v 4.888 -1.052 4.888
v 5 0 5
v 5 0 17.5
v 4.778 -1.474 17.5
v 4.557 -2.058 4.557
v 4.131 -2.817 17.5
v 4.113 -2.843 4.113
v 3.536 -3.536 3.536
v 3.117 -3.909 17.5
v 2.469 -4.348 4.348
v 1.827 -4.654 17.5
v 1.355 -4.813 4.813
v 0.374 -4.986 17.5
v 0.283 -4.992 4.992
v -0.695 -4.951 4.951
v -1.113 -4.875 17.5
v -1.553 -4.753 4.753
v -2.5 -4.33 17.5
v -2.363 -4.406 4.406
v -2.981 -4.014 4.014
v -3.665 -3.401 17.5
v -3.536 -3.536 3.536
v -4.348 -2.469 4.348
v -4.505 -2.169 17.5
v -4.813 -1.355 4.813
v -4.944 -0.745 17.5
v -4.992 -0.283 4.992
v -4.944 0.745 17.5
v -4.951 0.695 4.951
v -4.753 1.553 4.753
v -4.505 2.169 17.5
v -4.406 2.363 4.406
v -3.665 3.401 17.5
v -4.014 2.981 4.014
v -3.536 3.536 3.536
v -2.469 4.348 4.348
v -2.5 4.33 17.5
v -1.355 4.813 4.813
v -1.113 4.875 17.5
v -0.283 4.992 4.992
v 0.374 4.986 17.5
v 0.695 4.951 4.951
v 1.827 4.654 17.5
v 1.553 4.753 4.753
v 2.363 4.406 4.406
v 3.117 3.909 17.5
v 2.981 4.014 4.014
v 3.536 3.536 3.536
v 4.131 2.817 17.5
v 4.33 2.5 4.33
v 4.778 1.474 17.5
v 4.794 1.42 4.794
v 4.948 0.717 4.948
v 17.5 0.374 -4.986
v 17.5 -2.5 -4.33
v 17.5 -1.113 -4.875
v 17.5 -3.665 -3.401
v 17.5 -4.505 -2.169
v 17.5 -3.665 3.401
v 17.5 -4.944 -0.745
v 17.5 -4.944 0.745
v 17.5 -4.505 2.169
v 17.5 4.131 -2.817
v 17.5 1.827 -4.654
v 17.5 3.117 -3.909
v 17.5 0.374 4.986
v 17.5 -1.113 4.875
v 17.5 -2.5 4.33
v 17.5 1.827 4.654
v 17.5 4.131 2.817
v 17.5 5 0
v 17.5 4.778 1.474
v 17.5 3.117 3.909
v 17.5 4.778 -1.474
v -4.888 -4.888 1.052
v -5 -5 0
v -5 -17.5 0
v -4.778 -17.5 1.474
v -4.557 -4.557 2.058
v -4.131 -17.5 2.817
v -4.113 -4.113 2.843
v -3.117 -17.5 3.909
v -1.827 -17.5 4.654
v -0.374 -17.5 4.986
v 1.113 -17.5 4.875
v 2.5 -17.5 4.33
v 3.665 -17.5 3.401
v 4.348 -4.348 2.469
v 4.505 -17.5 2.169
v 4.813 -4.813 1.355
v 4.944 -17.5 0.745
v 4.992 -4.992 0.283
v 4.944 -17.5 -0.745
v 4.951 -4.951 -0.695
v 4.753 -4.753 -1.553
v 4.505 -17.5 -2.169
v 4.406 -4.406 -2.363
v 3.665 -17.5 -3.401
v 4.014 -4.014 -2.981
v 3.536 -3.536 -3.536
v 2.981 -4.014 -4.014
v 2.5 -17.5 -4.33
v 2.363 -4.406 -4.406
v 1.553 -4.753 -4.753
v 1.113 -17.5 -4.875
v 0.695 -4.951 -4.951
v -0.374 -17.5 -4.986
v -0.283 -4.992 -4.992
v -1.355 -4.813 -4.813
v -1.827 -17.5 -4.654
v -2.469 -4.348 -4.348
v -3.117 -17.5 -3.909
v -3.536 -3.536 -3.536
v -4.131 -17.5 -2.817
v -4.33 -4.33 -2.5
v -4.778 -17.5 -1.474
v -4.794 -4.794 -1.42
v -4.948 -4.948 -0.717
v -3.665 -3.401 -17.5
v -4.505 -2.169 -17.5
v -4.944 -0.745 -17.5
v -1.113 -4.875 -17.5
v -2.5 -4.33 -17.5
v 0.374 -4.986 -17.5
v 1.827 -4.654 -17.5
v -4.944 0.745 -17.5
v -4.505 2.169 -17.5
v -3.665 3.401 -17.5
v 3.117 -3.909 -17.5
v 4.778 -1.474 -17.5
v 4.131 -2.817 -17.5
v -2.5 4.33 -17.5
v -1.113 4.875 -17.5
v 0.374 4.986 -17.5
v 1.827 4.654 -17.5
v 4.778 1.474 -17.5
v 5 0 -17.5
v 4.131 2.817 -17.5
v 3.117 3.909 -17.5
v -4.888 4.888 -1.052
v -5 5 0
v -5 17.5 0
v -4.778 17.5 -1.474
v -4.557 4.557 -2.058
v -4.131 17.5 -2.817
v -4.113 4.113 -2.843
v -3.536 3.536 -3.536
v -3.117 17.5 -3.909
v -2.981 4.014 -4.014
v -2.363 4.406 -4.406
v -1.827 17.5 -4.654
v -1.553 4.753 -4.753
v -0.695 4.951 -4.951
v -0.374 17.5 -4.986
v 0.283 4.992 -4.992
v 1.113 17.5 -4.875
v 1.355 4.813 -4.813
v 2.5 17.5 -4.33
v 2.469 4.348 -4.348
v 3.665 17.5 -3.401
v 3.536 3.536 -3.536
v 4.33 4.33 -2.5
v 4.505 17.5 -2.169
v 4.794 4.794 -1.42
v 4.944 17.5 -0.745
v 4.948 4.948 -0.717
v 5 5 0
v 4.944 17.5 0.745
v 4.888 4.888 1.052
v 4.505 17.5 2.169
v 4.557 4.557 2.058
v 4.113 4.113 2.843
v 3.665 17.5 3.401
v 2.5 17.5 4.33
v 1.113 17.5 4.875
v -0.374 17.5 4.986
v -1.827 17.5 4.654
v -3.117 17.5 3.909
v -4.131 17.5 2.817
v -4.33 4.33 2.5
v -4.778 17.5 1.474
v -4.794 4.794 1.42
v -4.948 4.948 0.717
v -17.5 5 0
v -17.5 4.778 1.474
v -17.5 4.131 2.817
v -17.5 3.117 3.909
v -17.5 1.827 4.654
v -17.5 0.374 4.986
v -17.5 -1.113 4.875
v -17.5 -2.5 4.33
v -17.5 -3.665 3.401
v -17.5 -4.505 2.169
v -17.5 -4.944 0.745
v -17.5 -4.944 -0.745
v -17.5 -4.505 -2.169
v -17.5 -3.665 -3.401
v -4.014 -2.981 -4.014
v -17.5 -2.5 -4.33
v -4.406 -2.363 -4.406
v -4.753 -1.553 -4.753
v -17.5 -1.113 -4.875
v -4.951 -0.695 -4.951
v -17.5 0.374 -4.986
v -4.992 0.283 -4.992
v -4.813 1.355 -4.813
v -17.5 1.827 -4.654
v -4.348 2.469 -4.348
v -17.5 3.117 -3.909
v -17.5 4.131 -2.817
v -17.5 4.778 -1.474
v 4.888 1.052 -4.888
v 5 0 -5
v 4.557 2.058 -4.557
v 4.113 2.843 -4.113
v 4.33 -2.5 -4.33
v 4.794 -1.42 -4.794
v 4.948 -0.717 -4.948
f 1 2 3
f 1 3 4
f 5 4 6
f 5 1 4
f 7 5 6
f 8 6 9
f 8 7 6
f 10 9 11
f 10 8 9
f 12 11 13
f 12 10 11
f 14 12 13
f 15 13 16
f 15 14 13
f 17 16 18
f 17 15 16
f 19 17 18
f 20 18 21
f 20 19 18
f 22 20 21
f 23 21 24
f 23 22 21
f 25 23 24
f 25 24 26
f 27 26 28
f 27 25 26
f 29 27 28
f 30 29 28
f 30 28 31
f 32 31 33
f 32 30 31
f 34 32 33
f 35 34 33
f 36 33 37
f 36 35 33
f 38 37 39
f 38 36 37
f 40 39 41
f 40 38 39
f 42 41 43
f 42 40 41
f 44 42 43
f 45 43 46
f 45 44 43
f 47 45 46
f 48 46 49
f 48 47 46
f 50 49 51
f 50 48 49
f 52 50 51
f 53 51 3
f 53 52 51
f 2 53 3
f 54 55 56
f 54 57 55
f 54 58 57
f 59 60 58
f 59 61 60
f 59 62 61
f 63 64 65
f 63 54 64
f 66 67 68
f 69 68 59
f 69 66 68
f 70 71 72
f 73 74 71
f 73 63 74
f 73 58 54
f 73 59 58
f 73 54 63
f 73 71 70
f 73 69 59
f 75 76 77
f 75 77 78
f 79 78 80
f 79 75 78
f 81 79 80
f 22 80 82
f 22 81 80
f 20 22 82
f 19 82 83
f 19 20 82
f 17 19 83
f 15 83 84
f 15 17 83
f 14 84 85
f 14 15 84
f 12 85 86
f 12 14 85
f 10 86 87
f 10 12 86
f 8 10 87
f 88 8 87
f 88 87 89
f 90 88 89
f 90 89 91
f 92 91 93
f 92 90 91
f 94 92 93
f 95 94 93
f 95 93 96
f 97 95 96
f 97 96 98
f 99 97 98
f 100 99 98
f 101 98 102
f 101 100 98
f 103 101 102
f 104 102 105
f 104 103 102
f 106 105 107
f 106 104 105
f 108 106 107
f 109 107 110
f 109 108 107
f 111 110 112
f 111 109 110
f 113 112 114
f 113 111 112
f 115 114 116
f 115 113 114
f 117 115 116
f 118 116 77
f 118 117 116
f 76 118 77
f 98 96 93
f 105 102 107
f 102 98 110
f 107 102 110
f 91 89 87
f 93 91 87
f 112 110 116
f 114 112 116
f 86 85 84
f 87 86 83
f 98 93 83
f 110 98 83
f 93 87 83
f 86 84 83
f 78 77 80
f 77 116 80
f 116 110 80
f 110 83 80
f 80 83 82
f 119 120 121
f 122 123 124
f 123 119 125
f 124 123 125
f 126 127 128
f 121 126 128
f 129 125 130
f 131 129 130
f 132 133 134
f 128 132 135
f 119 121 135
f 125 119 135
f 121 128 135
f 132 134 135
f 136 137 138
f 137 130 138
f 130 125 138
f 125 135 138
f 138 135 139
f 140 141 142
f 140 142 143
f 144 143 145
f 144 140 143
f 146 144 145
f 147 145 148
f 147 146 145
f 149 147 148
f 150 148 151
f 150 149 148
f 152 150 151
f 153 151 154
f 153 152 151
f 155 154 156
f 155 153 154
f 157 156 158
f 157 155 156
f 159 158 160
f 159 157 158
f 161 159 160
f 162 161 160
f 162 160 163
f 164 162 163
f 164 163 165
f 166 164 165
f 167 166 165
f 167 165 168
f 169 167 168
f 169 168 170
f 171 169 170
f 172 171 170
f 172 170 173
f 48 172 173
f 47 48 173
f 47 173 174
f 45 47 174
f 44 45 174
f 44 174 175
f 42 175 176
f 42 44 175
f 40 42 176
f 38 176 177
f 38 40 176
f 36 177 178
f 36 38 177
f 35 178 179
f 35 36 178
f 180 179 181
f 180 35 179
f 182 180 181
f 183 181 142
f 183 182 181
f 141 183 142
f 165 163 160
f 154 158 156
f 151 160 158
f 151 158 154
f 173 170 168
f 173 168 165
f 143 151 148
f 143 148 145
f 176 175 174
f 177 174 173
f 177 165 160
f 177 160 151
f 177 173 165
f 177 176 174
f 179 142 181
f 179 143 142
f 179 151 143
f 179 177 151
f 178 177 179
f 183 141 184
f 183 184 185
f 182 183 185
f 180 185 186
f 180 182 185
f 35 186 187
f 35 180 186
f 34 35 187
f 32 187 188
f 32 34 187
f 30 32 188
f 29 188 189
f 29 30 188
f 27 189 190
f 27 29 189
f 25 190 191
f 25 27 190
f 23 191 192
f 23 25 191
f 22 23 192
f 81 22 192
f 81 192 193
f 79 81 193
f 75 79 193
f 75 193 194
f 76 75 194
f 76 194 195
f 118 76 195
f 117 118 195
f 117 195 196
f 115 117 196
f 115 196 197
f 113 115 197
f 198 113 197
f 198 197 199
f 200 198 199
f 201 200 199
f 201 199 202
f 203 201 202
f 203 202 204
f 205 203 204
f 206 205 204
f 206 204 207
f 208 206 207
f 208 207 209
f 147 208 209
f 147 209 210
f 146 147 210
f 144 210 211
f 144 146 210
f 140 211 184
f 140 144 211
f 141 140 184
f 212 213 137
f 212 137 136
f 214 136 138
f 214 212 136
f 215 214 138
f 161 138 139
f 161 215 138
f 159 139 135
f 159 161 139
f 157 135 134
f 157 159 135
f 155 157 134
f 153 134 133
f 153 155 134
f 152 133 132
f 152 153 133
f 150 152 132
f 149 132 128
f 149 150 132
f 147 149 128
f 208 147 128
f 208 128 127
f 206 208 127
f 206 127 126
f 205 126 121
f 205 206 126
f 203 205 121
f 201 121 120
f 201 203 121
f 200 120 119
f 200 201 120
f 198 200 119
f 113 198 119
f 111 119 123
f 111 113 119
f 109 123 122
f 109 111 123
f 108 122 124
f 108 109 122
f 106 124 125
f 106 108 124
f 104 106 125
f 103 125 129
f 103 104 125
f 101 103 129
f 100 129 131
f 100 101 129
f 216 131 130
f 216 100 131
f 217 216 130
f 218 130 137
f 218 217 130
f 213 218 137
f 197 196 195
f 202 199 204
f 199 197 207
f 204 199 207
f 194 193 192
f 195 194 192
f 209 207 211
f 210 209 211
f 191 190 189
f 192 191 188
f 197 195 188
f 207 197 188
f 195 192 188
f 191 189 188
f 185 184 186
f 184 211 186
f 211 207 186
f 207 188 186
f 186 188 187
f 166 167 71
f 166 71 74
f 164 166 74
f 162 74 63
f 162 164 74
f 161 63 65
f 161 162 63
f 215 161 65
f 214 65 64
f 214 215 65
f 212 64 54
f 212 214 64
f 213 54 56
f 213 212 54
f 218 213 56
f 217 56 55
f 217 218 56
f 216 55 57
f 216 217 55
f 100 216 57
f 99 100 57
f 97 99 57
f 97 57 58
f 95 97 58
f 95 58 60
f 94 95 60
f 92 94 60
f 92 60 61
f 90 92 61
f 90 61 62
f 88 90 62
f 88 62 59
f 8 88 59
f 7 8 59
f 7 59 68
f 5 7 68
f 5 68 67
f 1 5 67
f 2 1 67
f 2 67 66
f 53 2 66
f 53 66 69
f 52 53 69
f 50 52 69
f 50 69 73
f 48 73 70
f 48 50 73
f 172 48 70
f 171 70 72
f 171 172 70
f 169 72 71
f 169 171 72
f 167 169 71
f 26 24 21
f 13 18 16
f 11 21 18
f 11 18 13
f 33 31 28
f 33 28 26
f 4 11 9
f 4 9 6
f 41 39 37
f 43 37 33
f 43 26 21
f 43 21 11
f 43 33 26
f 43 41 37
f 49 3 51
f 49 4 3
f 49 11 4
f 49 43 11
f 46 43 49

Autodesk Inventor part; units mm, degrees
ref_plane "YZ Plane" through (0, 0, 0) normal (1, 0, 0) x (0, 1, 0)
ref_plane "XZ Plane" through (0, 0, 0) normal (0, 1, 0) x (-1, 0, 0)
ref_plane "XY Plane" through (0, 0, 0) normal (0, 0, 1) x (1, 0, 0)
sketch "Skizze1" plane through (0, 0, 0) normal (0, 0, 1) x (1, 0, 0)
  circle A0 centre (0, 0) radius 5
  dimension "d0" = 10
extrude "Extrusion1" add sketch "Skizze1" along normal mid plane 35
sketch "Skizze2" plane through (0, 0, 17.5) normal (0, 0, 1) x (1, 0, 0)
  circle A0 centre (0, 0) radius 5 projected
sketch "Skizze3" plane through (0, 0, 0) normal (0, 1, 0) x (-1, 0, 0)
  circle A0 centre (0, 0) radius 5
  dimension "d3" = 10
extrude "Extrusion2" add sketch "Skizze3" along normal mid plane 35
sketch "Skizze4" plane through (0, 0, 0) normal (1, 0, 0) x (0, 1, 0)
  line L0 (0, 0) -> (5, -5) projected
  circle A0 centre (0, 0) radius 5
  dimension "d6" = 10
extrude "Extrusion3" add sketch "Skizze4" along normal mid plane 35
properties part number "DrehAchse"
